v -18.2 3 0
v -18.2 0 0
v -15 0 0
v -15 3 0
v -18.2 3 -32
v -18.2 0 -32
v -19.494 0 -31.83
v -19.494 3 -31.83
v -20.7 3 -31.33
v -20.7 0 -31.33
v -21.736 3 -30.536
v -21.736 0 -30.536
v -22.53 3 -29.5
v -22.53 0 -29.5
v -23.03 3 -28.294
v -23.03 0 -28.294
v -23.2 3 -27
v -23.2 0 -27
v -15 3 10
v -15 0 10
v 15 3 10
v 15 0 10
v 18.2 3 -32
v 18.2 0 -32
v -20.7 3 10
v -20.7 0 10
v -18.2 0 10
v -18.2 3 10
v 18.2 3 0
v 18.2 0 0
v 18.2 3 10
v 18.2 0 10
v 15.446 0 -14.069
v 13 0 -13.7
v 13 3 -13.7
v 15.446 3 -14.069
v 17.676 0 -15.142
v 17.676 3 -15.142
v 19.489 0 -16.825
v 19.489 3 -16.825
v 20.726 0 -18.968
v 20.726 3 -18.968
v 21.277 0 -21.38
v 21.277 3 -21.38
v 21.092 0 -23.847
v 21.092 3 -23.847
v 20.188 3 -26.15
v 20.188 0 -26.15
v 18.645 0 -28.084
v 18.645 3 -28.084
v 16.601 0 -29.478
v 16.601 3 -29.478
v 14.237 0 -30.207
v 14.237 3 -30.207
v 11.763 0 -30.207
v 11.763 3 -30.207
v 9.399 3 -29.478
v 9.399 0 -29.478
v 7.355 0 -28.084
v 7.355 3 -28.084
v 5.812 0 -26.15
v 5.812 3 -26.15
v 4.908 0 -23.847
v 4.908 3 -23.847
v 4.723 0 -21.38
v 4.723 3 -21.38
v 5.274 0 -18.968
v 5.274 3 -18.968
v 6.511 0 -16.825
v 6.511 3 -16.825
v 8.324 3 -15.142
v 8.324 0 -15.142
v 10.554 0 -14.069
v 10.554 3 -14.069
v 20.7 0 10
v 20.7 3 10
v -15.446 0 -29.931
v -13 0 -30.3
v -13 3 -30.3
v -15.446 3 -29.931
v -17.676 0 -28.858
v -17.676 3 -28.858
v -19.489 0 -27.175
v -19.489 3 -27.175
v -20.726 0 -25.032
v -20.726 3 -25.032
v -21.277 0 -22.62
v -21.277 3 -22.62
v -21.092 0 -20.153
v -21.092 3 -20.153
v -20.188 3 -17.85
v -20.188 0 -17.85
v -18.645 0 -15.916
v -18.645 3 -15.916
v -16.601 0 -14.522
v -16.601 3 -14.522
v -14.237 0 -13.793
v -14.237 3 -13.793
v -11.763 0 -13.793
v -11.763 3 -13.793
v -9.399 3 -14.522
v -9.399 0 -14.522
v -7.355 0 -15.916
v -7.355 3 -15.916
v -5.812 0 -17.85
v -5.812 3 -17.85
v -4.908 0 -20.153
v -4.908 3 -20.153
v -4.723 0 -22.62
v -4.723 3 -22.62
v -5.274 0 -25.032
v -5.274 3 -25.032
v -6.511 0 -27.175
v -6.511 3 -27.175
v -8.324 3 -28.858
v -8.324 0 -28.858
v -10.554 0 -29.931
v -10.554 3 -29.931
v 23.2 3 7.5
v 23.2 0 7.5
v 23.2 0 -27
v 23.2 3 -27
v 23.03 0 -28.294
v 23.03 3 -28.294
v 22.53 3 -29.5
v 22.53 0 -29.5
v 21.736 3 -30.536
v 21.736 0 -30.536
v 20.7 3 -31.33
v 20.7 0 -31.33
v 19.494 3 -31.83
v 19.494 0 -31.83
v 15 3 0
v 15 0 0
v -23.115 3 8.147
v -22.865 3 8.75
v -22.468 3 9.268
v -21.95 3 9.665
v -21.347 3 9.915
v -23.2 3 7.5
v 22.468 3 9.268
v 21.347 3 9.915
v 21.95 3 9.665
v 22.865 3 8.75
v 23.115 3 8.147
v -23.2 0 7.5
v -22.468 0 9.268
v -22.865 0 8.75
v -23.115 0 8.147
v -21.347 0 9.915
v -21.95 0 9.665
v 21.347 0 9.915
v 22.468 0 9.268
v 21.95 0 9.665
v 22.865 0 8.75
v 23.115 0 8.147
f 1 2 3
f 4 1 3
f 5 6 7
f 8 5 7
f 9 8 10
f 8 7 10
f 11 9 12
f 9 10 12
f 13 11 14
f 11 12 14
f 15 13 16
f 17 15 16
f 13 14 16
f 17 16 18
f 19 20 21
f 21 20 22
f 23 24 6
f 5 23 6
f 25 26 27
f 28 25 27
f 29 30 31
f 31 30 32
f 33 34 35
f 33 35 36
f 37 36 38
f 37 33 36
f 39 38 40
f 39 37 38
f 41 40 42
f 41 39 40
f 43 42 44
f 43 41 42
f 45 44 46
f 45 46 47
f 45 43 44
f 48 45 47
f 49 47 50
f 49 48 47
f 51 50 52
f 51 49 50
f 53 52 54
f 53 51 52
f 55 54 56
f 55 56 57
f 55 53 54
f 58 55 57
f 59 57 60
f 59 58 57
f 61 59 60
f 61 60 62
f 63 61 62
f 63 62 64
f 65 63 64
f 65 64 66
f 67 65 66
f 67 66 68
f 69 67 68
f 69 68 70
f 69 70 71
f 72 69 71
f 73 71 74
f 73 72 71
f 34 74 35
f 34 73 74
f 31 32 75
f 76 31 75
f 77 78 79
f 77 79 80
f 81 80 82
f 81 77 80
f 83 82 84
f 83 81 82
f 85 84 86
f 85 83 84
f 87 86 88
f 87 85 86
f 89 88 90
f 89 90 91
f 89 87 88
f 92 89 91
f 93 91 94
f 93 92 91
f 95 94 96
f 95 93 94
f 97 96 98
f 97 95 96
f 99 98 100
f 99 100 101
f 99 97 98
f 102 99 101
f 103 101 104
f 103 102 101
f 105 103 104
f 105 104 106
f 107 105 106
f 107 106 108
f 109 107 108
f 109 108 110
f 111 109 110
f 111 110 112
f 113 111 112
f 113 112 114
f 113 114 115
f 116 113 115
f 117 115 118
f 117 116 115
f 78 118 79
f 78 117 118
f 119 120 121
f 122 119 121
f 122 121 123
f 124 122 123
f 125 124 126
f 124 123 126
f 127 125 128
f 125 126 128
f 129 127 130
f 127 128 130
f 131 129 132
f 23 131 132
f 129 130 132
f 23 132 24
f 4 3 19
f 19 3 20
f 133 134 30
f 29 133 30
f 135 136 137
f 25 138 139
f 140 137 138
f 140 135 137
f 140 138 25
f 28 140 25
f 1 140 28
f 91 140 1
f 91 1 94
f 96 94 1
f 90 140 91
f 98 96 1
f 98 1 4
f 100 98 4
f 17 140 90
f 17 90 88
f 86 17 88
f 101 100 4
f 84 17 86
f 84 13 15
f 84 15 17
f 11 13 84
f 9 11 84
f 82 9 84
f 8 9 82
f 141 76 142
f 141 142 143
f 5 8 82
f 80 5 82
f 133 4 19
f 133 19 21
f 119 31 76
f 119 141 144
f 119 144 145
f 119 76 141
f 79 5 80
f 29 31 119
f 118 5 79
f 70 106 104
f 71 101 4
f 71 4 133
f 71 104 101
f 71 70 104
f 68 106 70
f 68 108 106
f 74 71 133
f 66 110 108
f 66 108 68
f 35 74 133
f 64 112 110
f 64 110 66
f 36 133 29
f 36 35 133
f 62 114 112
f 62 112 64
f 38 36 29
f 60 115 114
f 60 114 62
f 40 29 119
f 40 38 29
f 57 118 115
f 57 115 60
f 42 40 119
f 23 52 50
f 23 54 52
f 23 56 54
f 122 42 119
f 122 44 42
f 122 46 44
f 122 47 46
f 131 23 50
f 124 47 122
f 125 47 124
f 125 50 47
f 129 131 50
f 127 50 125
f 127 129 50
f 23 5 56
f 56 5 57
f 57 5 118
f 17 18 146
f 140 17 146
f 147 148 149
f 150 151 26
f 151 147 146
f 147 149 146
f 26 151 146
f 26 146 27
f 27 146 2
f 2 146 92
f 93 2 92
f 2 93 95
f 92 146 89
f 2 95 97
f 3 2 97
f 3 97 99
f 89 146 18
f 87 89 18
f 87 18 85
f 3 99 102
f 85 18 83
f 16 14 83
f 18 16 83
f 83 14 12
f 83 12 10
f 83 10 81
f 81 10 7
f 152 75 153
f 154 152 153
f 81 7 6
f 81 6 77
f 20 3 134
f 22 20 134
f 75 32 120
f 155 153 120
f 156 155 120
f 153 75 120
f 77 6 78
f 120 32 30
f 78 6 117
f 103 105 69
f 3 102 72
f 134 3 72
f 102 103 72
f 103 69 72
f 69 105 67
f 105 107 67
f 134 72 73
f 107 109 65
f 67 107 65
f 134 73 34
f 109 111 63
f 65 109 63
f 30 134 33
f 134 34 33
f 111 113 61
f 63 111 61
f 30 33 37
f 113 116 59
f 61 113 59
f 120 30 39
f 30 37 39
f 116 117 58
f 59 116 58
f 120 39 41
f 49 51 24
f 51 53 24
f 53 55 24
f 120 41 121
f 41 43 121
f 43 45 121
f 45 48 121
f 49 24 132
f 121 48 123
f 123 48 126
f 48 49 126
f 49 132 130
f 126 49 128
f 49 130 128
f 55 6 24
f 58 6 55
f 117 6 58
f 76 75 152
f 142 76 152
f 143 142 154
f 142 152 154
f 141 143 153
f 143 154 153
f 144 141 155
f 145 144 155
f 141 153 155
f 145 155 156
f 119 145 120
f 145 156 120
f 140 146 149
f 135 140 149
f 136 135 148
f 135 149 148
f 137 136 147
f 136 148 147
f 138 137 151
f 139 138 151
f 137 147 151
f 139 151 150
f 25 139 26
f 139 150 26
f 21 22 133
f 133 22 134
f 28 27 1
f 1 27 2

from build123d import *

# Parameters (mm, degrees)
SKETCH_1_R      = 8.3
EXTRUDE_1_DEPTH = 3


with BuildPart() as part:
    # 草图1 → 凸台-拉伸1 (new body)
    with BuildSketch(Plane(origin=(0, 0, 0), x_dir=(1, 0, 0), z_dir=(0, 1, 0))):
        with BuildLine():
            Line((-15, 0), (-15, -10))
            Line((-15, -10), (15, -10))
            Line((15, -10), (15, 0))
            Line((15, 0), (18.2, 0))
            Line((18.2, 0), (18.2, -10))
            Line((18.2, -10), (20.7, -10))
            ThreePointArc((20.7, -10), (22.467766953, -9.267766953), (23.2, -7.5))
            Line((23.2, -7.5), (23.2, 12))
            Line((23.2, 12), (23.2, 27))
            ThreePointArc((23.2, 27), (21.735533906, 30.535533906), (18.2, 32))
            Line((18.2, 32), (-18.2, 32))
            ThreePointArc((-18.2, 32), (-21.735533906, 30.535533906), (-23.2, 27))
            Line((-23.2, 27), (-23.2, 12))
            Line((-23.2, 12), (-23.2, -7.5))
            ThreePointArc((-23.2, -7.5), (-22.467766953, -9.267766953), (-20.7, -10))
            Line((-20.7, -10), (-18.2, -10))
            Line((-18.2, -10), (-18.2, 0))
            Line((-18.2, 0), (-15, 0))
        make_face()
        with Locations(Location((13, 22, 0), (0, 0, 270))):
            Circle(SKETCH_1_R, mode=Mode.SUBTRACT)
        with Locations(Location((-13, 22, 0), (0, 0, 90))):
            Circle(SKETCH_1_R, mode=Mode.SUBTRACT)
    extrude(amount=EXTRUDE_1_DEPTH)


solid = part.part
